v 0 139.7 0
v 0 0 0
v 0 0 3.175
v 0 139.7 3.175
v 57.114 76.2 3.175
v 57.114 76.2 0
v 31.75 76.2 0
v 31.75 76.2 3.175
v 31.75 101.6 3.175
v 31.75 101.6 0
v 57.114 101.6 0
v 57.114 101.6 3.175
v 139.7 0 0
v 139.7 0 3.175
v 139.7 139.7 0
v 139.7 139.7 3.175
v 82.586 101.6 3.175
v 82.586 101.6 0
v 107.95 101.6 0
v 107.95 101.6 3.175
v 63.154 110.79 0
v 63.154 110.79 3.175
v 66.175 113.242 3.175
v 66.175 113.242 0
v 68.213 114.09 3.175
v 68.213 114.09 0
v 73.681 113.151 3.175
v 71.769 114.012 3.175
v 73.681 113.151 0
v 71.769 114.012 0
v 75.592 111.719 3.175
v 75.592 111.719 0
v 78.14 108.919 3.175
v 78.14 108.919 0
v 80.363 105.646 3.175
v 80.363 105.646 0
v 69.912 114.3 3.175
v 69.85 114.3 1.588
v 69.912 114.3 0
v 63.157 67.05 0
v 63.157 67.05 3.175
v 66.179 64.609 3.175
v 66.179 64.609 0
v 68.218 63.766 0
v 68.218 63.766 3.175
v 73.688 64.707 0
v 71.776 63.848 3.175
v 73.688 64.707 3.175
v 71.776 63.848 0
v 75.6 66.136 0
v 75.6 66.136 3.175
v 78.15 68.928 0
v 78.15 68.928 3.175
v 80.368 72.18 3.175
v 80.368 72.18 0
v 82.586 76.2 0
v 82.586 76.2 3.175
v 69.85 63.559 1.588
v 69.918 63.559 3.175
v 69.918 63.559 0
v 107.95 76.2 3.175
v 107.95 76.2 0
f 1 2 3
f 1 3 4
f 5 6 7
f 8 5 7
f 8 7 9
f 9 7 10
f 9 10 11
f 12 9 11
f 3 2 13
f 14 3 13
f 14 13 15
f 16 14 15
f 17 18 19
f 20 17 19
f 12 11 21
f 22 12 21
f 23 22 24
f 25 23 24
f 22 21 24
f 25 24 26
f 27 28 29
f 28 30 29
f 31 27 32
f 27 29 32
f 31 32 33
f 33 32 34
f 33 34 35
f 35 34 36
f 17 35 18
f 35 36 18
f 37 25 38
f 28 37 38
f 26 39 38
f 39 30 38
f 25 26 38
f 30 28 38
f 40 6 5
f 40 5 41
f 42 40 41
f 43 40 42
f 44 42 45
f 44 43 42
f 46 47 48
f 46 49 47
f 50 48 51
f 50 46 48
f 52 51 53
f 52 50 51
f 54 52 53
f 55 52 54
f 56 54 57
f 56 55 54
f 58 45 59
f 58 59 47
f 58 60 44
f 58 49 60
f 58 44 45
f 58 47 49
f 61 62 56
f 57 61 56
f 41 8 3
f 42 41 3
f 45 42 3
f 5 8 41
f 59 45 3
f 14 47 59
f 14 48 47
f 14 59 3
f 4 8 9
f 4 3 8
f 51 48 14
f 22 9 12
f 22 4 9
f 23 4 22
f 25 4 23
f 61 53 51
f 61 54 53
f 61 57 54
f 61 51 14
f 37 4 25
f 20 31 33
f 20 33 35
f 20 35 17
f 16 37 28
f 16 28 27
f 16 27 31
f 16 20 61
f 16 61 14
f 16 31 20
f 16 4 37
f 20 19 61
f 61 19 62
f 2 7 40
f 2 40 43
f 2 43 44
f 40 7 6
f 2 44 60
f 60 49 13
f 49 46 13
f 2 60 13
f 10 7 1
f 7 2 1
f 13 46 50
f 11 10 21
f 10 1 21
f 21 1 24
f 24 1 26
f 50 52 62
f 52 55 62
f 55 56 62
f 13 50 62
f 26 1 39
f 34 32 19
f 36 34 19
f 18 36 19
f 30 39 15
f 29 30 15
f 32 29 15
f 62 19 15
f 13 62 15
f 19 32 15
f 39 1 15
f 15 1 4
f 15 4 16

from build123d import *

# Parameters (mm, degrees)
SKETCH1_W           = 139.7
SKETCH1_H           = 139.7
BOSS_EXTRUDE1_DEPTH = 3.175


with BuildPart() as part:
    # Sketch1 → Boss-Extrude1 (new body)
    with BuildSketch(Plane.XY):
        with Locations((69.85, 69.85)):
            Rectangle(SKETCH1_W, SKETCH1_H)
        with BuildLine():
            Line((31.75, 101.6), (57.114301478, 101.6))
            add(Edge.make_bspline(
                [(57.114301478, 101.6), (69.85, 127), (82.585698522, 101.6)],
                knots=[0, 0, 0, 1, 1, 1], degree=2))
            Line((82.585698522, 101.6), (107.95, 101.6))
            Line((107.95, 101.6), (107.95, 76.2))
            Line((107.95, 76.2), (82.585698522, 76.2))
            add(Edge.make_bspline(
                [(57.114301478, 76.2), (69.85, 50.917743629), (82.585698522, 76.2)],
                knots=[0, 0, 0, 1, 1, 1], degree=2))
            Line((57.114301478, 76.2), (31.75, 76.2))
            Line((31.75, 76.2), (31.75, 101.6))
        make_face(mode=Mode.SUBTRACT)
    extrude(amount=BOSS_EXTRUDE1_DEPTH)


solid = part.part
